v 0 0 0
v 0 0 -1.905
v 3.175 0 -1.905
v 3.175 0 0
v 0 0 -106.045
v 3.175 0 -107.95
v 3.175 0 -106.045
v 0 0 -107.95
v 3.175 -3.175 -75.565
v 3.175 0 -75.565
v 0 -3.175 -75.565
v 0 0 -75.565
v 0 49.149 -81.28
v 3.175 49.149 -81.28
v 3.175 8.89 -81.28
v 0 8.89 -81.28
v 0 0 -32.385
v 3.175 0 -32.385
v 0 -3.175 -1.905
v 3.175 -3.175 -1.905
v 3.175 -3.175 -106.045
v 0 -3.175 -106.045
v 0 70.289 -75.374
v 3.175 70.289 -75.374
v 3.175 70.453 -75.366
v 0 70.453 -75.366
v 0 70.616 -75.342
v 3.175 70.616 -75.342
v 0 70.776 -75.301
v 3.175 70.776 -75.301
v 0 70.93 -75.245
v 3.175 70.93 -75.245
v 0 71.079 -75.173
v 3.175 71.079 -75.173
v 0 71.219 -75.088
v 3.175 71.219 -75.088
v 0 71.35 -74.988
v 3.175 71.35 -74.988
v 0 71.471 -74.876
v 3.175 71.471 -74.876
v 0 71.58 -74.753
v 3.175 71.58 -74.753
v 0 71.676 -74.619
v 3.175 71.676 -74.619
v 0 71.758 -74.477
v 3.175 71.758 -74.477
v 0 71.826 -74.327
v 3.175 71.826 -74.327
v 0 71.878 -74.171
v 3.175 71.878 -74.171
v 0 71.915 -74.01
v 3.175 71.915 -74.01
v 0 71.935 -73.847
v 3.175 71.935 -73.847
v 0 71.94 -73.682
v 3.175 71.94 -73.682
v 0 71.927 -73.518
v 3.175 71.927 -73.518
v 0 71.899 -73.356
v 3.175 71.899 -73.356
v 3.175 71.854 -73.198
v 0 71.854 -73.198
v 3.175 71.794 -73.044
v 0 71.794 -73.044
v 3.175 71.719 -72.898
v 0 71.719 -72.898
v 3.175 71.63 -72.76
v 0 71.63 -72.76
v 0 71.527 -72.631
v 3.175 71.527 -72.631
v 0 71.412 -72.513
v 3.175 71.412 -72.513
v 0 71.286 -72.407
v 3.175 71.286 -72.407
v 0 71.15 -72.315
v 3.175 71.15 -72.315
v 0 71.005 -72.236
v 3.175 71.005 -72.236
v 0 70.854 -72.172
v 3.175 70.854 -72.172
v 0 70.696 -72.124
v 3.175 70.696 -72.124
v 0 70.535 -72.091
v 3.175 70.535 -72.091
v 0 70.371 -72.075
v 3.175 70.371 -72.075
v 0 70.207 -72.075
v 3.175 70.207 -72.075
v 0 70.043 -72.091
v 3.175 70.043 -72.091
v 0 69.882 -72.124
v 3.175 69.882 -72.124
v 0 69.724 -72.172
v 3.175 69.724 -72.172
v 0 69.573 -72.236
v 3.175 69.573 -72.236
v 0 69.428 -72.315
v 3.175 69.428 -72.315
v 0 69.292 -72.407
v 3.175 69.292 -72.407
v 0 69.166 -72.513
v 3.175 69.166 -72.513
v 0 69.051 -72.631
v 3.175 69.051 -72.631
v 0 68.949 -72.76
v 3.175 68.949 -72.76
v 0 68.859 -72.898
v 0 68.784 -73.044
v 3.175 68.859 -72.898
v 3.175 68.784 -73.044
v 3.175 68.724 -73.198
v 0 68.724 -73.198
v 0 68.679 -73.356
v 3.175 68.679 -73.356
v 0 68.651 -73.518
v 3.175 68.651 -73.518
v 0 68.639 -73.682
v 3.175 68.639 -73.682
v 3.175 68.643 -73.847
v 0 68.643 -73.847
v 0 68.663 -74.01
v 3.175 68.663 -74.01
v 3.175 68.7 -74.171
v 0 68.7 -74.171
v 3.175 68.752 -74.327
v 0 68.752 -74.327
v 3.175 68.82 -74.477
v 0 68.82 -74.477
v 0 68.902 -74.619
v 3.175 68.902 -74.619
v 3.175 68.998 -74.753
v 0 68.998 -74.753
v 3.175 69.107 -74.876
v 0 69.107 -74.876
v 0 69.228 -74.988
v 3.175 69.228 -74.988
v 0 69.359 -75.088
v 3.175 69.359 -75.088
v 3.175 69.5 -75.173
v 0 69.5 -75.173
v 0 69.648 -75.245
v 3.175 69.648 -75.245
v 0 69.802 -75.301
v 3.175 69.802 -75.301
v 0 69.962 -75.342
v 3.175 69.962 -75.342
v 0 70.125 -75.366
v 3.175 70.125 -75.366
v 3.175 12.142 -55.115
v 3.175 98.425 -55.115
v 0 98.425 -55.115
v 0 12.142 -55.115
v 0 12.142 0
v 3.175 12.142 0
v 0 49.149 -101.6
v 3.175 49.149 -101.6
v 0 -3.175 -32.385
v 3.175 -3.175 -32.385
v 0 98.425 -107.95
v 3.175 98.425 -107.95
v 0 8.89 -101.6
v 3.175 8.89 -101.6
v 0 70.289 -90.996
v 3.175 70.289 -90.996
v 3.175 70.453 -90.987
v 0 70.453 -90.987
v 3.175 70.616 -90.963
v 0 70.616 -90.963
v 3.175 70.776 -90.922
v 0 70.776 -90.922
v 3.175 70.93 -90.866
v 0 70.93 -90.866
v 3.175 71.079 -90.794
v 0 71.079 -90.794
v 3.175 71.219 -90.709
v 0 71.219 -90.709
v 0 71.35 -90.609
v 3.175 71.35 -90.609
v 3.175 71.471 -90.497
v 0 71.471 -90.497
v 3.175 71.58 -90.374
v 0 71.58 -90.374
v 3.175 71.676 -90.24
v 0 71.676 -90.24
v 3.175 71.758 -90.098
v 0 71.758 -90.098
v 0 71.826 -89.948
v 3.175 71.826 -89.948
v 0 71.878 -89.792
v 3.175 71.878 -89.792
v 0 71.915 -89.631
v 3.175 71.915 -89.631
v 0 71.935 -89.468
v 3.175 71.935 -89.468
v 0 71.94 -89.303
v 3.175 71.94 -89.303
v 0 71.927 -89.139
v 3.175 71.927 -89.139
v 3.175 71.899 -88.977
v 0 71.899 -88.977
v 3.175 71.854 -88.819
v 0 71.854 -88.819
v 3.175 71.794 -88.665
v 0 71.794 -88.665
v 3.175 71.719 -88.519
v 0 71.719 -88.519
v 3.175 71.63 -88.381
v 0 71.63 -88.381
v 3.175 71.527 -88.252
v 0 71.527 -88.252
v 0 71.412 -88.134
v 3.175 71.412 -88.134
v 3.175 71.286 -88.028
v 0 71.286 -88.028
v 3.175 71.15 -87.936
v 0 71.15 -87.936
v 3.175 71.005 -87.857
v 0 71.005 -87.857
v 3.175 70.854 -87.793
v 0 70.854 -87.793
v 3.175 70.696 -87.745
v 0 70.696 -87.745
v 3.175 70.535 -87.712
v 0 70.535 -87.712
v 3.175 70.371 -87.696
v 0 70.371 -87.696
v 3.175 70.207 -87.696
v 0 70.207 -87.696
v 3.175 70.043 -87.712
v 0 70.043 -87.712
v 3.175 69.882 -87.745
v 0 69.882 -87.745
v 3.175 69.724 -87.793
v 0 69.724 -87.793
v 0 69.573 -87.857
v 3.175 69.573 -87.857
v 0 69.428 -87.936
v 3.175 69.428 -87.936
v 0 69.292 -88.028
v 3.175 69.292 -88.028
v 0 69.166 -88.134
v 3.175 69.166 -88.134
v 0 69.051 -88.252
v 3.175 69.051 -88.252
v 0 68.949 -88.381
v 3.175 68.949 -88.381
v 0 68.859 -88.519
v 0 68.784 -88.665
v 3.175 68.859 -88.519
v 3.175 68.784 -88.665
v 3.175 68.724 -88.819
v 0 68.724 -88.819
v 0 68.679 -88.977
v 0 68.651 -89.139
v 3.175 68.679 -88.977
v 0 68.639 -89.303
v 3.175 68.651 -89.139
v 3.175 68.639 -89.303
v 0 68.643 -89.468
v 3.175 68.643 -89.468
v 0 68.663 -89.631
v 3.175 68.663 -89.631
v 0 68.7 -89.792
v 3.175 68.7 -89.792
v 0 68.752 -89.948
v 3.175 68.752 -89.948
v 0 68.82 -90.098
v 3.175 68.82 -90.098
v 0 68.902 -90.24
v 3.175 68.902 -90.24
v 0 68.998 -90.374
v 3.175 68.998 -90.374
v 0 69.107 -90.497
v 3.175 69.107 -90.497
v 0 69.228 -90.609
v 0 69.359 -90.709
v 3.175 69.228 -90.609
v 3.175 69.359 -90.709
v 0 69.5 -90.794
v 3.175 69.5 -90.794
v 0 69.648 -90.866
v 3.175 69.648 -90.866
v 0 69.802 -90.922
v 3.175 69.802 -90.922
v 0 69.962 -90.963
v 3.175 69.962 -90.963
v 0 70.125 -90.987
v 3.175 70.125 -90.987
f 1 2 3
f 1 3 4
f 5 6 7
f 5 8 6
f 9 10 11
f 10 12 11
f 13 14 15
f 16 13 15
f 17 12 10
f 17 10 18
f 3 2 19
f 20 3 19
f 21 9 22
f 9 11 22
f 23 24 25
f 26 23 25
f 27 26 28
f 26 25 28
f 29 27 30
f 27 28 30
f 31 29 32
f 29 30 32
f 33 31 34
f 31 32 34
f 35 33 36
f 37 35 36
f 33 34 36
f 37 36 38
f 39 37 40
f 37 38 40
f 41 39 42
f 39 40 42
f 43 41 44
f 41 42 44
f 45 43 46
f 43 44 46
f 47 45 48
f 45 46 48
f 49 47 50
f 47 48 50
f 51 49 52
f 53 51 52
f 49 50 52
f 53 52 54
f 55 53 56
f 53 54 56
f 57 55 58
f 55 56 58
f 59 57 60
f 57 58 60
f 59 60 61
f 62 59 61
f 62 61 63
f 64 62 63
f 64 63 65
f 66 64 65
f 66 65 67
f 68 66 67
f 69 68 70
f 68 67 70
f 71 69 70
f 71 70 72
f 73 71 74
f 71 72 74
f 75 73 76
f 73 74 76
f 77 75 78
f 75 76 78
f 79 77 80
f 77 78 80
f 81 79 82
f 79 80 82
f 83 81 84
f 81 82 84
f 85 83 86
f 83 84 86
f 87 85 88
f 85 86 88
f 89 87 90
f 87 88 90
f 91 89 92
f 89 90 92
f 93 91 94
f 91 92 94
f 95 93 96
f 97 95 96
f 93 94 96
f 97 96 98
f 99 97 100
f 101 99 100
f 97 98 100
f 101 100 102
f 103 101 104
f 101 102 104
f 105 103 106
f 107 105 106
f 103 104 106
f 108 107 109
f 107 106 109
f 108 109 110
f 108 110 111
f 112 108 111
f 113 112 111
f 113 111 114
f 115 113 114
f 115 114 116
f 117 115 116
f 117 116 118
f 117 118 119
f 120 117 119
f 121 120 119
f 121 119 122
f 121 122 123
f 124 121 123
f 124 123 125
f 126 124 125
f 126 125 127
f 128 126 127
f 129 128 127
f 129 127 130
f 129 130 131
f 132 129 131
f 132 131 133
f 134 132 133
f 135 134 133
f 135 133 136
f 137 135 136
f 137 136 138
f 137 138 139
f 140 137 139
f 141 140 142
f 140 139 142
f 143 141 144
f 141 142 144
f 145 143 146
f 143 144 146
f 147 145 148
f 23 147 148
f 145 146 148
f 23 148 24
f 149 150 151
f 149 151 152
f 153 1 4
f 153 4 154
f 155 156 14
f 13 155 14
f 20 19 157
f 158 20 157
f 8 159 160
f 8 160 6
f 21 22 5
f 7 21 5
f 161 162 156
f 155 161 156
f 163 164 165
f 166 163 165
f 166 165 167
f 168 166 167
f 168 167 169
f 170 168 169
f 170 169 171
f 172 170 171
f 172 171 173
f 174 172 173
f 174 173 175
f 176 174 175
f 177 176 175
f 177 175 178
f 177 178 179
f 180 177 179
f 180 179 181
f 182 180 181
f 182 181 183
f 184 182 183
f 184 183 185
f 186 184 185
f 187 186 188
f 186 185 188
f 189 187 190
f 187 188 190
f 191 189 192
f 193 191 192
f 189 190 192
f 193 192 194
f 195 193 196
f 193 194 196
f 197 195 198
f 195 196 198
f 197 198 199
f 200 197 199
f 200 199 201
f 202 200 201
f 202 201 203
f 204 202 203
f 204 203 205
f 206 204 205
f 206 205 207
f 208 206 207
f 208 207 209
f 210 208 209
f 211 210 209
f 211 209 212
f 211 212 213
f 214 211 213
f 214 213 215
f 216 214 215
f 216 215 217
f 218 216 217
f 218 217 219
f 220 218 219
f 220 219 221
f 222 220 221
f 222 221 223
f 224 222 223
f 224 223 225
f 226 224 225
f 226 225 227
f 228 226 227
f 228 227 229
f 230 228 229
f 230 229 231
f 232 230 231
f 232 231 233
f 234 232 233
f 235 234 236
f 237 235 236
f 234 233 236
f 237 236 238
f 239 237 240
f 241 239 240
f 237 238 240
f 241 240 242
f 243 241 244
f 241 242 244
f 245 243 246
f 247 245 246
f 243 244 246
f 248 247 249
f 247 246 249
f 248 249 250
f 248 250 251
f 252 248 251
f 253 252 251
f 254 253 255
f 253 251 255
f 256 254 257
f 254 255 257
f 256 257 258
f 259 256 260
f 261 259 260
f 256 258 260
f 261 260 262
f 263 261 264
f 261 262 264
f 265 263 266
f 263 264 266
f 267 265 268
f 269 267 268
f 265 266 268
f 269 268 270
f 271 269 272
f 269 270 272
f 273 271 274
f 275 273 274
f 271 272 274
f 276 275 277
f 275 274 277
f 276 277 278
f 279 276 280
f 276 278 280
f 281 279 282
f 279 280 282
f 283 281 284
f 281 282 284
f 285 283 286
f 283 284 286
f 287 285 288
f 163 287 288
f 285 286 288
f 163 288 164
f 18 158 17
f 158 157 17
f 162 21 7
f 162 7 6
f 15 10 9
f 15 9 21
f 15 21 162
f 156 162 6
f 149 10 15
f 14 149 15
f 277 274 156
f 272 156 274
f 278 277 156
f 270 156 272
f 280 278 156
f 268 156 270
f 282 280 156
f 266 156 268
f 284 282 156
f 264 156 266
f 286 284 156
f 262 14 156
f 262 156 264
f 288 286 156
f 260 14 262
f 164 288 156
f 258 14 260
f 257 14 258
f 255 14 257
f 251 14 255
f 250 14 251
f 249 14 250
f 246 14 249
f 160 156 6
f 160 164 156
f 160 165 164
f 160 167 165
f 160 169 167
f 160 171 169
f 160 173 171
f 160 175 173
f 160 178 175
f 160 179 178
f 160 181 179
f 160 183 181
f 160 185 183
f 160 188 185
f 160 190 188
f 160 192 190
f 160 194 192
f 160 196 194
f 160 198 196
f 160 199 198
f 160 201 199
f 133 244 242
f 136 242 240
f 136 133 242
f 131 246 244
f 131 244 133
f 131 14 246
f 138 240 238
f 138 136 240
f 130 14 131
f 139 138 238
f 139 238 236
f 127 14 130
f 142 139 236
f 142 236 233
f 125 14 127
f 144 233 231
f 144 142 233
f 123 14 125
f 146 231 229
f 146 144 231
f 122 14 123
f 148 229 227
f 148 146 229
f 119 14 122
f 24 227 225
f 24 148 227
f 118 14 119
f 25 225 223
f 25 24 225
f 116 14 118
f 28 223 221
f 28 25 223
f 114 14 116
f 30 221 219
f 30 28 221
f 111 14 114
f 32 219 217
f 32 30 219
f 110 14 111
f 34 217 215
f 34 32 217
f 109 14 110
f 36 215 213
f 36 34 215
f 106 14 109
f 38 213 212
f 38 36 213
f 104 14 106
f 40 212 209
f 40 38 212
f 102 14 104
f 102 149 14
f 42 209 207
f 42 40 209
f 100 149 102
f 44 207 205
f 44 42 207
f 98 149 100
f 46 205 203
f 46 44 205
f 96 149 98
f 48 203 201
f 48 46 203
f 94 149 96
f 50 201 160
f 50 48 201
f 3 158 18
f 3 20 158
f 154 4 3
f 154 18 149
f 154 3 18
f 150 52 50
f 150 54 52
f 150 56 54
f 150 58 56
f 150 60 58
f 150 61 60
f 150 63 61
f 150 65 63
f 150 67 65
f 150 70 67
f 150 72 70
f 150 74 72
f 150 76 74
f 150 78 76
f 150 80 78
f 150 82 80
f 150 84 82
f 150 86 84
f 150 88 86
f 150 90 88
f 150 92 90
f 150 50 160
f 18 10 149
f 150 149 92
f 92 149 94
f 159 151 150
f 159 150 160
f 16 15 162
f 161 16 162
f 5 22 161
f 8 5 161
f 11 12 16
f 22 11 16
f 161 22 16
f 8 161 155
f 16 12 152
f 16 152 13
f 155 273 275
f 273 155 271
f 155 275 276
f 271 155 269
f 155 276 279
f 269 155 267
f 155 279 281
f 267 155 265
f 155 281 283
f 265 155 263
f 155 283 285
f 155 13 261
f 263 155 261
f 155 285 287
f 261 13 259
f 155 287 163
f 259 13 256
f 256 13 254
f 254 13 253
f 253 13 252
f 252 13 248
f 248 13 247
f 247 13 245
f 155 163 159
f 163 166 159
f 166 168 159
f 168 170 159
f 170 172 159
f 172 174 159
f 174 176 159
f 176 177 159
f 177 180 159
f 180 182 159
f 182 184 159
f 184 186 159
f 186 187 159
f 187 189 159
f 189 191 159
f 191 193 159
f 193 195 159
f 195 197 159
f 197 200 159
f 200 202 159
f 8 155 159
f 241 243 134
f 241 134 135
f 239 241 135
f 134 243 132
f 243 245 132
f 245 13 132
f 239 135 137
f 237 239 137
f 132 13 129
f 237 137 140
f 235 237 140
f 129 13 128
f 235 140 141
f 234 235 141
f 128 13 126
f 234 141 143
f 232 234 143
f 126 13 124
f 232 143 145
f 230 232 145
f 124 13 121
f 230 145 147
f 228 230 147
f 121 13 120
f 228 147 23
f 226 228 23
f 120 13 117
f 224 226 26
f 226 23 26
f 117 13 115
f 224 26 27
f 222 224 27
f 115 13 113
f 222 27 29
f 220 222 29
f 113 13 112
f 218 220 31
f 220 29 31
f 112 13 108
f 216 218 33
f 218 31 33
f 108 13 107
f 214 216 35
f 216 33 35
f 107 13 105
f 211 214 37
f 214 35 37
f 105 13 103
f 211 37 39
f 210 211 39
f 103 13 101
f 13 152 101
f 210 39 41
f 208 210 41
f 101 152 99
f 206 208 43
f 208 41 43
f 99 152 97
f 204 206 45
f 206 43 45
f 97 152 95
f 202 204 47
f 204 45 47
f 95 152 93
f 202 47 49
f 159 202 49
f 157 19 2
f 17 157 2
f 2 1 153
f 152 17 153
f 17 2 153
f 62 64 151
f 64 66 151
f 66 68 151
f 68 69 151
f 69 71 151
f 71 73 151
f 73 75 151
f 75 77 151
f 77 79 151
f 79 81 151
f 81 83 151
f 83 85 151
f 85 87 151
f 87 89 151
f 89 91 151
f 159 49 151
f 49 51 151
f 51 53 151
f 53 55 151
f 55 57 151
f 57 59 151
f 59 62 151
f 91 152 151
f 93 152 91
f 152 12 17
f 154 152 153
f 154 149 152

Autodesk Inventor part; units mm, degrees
ref_plane "YZ Plane" through (0, 0, 0) normal (1, 0, 0) x (0, 1, 0)
ref_plane "XZ Plane" through (0, 0, 0) normal (0, 1, 0) x (-1, 0, 0)
ref_plane "XY Plane" through (0, 0, 0) normal (0, 0, 1) x (1, 0, 0)
sketch "Sketch1" plane through (0, 0, 0) normal (1, 0, 0) x (0, 1, 0)
  line L0 (0, 0) -> (98.425, 0)
  line L1 (98.425, 0) -> (98.425, -107.95)
  line L2 (98.425, -107.95) -> (0, -107.95)
  line L3 (0, -107.95) -> (0, 0)
  line L4 (0, -1.905) -> (-3.175, -1.905)
  line L5 (-3.175, -1.905) -> (-3.175, -32.385)
  line L6 (-3.175, -32.385) -> (0, -32.385)
  line L7 (0, -32.385) -> (0, -1.905)
  line L8 (0, -75.565) -> (-3.175, -75.565)
  line L9 (-3.175, -75.565) -> (-3.175, -106.045)
  line L10 (-3.175, -106.045) -> (0, -106.045)
  line L11 (0, -106.045) -> (0, -75.565)
  dimension "d0" = 107.95
  dimension "d1" = 3.175
  dimension "d2" = 3.175
  dimension "d3" = 30.48
  dimension "d4" = 30.48
  dimension "d5" = 1.905
  dimension "d6" = 1.905
  dimension "d7" = 98.425
extrude "Extrusion1" add sketch "Sketch1" along normal blind 3.175
sketch "Sketch2" plane through (3.175, 0, 0) normal (1, 0, 0) x (0, 0, -1)
  line L0 (101.6, 49.149) -> (81.28, 49.149)
  line L1 (81.28, 49.149) -> (81.28, 8.89)
  line L2 (81.28, 8.89) -> (101.6, 8.89)
  line L3 (101.6, 8.89) -> (101.6, 49.149)
  line L4 (32.385, 0) -> (75.565, 0) projected
  line L5 (0, 98.425) -> (0, 0) projected
  line L6 (107.95, 0) -> (107.95, 98.425) projected
  dimension "d10" = 40.259
  dimension "d11" = 20.32
  dimension "d12" = 8.89
  dimension "d14" = 6.35
extrude "Extrusion2" cut sketch "Sketch2" against normal blind 3.175
sketch "Sketch3" plane through (3.175, 0, 0) normal (1, 0, 0) x (0, 0, -1)
  point P0 (0, 0)
sketch "Sketch4" plane through (3.175, 0, 0) normal (1, 0, 0) x (0, 0, -1)
  line L0 (-26.3959, 105.0556) -> (55.1146, 105.0556)
  line L1 (55.1146, 105.0556) -> (55.1146, 12.1421)
  line L2 (55.1146, 12.1421) -> (-26.3959, 12.1421)
  line L3 (-26.3959, 12.1421) -> (-26.3959, 105.0556)
  point P0 (0, 0)
extrude "Extrusion3" cut sketch "Sketch4" against normal blind 3.175
sketch "Sketch5" plane through (3.175, 0, 0) normal (1, 0, 0) x (0, 0, -1)
  circle A0 centre (73.7235, 70.2891) radius 1.651
  circle A1 centre (89.3445, 70.2891) radius 1.651
  line L0 (107.95, 0) -> (107.95, 98.425) projected
  point P0 (0, 0)
  dimension "d19" = 3.302
  dimension "d20" = 3.302
  dimension "d21" = 15.621
  dimension "d22" = 18.6055
  dimension "d23" = 0
extrude "Extrusion4" cut sketch "Sketch5" against normal blind 3.175
properties part number "rib"
